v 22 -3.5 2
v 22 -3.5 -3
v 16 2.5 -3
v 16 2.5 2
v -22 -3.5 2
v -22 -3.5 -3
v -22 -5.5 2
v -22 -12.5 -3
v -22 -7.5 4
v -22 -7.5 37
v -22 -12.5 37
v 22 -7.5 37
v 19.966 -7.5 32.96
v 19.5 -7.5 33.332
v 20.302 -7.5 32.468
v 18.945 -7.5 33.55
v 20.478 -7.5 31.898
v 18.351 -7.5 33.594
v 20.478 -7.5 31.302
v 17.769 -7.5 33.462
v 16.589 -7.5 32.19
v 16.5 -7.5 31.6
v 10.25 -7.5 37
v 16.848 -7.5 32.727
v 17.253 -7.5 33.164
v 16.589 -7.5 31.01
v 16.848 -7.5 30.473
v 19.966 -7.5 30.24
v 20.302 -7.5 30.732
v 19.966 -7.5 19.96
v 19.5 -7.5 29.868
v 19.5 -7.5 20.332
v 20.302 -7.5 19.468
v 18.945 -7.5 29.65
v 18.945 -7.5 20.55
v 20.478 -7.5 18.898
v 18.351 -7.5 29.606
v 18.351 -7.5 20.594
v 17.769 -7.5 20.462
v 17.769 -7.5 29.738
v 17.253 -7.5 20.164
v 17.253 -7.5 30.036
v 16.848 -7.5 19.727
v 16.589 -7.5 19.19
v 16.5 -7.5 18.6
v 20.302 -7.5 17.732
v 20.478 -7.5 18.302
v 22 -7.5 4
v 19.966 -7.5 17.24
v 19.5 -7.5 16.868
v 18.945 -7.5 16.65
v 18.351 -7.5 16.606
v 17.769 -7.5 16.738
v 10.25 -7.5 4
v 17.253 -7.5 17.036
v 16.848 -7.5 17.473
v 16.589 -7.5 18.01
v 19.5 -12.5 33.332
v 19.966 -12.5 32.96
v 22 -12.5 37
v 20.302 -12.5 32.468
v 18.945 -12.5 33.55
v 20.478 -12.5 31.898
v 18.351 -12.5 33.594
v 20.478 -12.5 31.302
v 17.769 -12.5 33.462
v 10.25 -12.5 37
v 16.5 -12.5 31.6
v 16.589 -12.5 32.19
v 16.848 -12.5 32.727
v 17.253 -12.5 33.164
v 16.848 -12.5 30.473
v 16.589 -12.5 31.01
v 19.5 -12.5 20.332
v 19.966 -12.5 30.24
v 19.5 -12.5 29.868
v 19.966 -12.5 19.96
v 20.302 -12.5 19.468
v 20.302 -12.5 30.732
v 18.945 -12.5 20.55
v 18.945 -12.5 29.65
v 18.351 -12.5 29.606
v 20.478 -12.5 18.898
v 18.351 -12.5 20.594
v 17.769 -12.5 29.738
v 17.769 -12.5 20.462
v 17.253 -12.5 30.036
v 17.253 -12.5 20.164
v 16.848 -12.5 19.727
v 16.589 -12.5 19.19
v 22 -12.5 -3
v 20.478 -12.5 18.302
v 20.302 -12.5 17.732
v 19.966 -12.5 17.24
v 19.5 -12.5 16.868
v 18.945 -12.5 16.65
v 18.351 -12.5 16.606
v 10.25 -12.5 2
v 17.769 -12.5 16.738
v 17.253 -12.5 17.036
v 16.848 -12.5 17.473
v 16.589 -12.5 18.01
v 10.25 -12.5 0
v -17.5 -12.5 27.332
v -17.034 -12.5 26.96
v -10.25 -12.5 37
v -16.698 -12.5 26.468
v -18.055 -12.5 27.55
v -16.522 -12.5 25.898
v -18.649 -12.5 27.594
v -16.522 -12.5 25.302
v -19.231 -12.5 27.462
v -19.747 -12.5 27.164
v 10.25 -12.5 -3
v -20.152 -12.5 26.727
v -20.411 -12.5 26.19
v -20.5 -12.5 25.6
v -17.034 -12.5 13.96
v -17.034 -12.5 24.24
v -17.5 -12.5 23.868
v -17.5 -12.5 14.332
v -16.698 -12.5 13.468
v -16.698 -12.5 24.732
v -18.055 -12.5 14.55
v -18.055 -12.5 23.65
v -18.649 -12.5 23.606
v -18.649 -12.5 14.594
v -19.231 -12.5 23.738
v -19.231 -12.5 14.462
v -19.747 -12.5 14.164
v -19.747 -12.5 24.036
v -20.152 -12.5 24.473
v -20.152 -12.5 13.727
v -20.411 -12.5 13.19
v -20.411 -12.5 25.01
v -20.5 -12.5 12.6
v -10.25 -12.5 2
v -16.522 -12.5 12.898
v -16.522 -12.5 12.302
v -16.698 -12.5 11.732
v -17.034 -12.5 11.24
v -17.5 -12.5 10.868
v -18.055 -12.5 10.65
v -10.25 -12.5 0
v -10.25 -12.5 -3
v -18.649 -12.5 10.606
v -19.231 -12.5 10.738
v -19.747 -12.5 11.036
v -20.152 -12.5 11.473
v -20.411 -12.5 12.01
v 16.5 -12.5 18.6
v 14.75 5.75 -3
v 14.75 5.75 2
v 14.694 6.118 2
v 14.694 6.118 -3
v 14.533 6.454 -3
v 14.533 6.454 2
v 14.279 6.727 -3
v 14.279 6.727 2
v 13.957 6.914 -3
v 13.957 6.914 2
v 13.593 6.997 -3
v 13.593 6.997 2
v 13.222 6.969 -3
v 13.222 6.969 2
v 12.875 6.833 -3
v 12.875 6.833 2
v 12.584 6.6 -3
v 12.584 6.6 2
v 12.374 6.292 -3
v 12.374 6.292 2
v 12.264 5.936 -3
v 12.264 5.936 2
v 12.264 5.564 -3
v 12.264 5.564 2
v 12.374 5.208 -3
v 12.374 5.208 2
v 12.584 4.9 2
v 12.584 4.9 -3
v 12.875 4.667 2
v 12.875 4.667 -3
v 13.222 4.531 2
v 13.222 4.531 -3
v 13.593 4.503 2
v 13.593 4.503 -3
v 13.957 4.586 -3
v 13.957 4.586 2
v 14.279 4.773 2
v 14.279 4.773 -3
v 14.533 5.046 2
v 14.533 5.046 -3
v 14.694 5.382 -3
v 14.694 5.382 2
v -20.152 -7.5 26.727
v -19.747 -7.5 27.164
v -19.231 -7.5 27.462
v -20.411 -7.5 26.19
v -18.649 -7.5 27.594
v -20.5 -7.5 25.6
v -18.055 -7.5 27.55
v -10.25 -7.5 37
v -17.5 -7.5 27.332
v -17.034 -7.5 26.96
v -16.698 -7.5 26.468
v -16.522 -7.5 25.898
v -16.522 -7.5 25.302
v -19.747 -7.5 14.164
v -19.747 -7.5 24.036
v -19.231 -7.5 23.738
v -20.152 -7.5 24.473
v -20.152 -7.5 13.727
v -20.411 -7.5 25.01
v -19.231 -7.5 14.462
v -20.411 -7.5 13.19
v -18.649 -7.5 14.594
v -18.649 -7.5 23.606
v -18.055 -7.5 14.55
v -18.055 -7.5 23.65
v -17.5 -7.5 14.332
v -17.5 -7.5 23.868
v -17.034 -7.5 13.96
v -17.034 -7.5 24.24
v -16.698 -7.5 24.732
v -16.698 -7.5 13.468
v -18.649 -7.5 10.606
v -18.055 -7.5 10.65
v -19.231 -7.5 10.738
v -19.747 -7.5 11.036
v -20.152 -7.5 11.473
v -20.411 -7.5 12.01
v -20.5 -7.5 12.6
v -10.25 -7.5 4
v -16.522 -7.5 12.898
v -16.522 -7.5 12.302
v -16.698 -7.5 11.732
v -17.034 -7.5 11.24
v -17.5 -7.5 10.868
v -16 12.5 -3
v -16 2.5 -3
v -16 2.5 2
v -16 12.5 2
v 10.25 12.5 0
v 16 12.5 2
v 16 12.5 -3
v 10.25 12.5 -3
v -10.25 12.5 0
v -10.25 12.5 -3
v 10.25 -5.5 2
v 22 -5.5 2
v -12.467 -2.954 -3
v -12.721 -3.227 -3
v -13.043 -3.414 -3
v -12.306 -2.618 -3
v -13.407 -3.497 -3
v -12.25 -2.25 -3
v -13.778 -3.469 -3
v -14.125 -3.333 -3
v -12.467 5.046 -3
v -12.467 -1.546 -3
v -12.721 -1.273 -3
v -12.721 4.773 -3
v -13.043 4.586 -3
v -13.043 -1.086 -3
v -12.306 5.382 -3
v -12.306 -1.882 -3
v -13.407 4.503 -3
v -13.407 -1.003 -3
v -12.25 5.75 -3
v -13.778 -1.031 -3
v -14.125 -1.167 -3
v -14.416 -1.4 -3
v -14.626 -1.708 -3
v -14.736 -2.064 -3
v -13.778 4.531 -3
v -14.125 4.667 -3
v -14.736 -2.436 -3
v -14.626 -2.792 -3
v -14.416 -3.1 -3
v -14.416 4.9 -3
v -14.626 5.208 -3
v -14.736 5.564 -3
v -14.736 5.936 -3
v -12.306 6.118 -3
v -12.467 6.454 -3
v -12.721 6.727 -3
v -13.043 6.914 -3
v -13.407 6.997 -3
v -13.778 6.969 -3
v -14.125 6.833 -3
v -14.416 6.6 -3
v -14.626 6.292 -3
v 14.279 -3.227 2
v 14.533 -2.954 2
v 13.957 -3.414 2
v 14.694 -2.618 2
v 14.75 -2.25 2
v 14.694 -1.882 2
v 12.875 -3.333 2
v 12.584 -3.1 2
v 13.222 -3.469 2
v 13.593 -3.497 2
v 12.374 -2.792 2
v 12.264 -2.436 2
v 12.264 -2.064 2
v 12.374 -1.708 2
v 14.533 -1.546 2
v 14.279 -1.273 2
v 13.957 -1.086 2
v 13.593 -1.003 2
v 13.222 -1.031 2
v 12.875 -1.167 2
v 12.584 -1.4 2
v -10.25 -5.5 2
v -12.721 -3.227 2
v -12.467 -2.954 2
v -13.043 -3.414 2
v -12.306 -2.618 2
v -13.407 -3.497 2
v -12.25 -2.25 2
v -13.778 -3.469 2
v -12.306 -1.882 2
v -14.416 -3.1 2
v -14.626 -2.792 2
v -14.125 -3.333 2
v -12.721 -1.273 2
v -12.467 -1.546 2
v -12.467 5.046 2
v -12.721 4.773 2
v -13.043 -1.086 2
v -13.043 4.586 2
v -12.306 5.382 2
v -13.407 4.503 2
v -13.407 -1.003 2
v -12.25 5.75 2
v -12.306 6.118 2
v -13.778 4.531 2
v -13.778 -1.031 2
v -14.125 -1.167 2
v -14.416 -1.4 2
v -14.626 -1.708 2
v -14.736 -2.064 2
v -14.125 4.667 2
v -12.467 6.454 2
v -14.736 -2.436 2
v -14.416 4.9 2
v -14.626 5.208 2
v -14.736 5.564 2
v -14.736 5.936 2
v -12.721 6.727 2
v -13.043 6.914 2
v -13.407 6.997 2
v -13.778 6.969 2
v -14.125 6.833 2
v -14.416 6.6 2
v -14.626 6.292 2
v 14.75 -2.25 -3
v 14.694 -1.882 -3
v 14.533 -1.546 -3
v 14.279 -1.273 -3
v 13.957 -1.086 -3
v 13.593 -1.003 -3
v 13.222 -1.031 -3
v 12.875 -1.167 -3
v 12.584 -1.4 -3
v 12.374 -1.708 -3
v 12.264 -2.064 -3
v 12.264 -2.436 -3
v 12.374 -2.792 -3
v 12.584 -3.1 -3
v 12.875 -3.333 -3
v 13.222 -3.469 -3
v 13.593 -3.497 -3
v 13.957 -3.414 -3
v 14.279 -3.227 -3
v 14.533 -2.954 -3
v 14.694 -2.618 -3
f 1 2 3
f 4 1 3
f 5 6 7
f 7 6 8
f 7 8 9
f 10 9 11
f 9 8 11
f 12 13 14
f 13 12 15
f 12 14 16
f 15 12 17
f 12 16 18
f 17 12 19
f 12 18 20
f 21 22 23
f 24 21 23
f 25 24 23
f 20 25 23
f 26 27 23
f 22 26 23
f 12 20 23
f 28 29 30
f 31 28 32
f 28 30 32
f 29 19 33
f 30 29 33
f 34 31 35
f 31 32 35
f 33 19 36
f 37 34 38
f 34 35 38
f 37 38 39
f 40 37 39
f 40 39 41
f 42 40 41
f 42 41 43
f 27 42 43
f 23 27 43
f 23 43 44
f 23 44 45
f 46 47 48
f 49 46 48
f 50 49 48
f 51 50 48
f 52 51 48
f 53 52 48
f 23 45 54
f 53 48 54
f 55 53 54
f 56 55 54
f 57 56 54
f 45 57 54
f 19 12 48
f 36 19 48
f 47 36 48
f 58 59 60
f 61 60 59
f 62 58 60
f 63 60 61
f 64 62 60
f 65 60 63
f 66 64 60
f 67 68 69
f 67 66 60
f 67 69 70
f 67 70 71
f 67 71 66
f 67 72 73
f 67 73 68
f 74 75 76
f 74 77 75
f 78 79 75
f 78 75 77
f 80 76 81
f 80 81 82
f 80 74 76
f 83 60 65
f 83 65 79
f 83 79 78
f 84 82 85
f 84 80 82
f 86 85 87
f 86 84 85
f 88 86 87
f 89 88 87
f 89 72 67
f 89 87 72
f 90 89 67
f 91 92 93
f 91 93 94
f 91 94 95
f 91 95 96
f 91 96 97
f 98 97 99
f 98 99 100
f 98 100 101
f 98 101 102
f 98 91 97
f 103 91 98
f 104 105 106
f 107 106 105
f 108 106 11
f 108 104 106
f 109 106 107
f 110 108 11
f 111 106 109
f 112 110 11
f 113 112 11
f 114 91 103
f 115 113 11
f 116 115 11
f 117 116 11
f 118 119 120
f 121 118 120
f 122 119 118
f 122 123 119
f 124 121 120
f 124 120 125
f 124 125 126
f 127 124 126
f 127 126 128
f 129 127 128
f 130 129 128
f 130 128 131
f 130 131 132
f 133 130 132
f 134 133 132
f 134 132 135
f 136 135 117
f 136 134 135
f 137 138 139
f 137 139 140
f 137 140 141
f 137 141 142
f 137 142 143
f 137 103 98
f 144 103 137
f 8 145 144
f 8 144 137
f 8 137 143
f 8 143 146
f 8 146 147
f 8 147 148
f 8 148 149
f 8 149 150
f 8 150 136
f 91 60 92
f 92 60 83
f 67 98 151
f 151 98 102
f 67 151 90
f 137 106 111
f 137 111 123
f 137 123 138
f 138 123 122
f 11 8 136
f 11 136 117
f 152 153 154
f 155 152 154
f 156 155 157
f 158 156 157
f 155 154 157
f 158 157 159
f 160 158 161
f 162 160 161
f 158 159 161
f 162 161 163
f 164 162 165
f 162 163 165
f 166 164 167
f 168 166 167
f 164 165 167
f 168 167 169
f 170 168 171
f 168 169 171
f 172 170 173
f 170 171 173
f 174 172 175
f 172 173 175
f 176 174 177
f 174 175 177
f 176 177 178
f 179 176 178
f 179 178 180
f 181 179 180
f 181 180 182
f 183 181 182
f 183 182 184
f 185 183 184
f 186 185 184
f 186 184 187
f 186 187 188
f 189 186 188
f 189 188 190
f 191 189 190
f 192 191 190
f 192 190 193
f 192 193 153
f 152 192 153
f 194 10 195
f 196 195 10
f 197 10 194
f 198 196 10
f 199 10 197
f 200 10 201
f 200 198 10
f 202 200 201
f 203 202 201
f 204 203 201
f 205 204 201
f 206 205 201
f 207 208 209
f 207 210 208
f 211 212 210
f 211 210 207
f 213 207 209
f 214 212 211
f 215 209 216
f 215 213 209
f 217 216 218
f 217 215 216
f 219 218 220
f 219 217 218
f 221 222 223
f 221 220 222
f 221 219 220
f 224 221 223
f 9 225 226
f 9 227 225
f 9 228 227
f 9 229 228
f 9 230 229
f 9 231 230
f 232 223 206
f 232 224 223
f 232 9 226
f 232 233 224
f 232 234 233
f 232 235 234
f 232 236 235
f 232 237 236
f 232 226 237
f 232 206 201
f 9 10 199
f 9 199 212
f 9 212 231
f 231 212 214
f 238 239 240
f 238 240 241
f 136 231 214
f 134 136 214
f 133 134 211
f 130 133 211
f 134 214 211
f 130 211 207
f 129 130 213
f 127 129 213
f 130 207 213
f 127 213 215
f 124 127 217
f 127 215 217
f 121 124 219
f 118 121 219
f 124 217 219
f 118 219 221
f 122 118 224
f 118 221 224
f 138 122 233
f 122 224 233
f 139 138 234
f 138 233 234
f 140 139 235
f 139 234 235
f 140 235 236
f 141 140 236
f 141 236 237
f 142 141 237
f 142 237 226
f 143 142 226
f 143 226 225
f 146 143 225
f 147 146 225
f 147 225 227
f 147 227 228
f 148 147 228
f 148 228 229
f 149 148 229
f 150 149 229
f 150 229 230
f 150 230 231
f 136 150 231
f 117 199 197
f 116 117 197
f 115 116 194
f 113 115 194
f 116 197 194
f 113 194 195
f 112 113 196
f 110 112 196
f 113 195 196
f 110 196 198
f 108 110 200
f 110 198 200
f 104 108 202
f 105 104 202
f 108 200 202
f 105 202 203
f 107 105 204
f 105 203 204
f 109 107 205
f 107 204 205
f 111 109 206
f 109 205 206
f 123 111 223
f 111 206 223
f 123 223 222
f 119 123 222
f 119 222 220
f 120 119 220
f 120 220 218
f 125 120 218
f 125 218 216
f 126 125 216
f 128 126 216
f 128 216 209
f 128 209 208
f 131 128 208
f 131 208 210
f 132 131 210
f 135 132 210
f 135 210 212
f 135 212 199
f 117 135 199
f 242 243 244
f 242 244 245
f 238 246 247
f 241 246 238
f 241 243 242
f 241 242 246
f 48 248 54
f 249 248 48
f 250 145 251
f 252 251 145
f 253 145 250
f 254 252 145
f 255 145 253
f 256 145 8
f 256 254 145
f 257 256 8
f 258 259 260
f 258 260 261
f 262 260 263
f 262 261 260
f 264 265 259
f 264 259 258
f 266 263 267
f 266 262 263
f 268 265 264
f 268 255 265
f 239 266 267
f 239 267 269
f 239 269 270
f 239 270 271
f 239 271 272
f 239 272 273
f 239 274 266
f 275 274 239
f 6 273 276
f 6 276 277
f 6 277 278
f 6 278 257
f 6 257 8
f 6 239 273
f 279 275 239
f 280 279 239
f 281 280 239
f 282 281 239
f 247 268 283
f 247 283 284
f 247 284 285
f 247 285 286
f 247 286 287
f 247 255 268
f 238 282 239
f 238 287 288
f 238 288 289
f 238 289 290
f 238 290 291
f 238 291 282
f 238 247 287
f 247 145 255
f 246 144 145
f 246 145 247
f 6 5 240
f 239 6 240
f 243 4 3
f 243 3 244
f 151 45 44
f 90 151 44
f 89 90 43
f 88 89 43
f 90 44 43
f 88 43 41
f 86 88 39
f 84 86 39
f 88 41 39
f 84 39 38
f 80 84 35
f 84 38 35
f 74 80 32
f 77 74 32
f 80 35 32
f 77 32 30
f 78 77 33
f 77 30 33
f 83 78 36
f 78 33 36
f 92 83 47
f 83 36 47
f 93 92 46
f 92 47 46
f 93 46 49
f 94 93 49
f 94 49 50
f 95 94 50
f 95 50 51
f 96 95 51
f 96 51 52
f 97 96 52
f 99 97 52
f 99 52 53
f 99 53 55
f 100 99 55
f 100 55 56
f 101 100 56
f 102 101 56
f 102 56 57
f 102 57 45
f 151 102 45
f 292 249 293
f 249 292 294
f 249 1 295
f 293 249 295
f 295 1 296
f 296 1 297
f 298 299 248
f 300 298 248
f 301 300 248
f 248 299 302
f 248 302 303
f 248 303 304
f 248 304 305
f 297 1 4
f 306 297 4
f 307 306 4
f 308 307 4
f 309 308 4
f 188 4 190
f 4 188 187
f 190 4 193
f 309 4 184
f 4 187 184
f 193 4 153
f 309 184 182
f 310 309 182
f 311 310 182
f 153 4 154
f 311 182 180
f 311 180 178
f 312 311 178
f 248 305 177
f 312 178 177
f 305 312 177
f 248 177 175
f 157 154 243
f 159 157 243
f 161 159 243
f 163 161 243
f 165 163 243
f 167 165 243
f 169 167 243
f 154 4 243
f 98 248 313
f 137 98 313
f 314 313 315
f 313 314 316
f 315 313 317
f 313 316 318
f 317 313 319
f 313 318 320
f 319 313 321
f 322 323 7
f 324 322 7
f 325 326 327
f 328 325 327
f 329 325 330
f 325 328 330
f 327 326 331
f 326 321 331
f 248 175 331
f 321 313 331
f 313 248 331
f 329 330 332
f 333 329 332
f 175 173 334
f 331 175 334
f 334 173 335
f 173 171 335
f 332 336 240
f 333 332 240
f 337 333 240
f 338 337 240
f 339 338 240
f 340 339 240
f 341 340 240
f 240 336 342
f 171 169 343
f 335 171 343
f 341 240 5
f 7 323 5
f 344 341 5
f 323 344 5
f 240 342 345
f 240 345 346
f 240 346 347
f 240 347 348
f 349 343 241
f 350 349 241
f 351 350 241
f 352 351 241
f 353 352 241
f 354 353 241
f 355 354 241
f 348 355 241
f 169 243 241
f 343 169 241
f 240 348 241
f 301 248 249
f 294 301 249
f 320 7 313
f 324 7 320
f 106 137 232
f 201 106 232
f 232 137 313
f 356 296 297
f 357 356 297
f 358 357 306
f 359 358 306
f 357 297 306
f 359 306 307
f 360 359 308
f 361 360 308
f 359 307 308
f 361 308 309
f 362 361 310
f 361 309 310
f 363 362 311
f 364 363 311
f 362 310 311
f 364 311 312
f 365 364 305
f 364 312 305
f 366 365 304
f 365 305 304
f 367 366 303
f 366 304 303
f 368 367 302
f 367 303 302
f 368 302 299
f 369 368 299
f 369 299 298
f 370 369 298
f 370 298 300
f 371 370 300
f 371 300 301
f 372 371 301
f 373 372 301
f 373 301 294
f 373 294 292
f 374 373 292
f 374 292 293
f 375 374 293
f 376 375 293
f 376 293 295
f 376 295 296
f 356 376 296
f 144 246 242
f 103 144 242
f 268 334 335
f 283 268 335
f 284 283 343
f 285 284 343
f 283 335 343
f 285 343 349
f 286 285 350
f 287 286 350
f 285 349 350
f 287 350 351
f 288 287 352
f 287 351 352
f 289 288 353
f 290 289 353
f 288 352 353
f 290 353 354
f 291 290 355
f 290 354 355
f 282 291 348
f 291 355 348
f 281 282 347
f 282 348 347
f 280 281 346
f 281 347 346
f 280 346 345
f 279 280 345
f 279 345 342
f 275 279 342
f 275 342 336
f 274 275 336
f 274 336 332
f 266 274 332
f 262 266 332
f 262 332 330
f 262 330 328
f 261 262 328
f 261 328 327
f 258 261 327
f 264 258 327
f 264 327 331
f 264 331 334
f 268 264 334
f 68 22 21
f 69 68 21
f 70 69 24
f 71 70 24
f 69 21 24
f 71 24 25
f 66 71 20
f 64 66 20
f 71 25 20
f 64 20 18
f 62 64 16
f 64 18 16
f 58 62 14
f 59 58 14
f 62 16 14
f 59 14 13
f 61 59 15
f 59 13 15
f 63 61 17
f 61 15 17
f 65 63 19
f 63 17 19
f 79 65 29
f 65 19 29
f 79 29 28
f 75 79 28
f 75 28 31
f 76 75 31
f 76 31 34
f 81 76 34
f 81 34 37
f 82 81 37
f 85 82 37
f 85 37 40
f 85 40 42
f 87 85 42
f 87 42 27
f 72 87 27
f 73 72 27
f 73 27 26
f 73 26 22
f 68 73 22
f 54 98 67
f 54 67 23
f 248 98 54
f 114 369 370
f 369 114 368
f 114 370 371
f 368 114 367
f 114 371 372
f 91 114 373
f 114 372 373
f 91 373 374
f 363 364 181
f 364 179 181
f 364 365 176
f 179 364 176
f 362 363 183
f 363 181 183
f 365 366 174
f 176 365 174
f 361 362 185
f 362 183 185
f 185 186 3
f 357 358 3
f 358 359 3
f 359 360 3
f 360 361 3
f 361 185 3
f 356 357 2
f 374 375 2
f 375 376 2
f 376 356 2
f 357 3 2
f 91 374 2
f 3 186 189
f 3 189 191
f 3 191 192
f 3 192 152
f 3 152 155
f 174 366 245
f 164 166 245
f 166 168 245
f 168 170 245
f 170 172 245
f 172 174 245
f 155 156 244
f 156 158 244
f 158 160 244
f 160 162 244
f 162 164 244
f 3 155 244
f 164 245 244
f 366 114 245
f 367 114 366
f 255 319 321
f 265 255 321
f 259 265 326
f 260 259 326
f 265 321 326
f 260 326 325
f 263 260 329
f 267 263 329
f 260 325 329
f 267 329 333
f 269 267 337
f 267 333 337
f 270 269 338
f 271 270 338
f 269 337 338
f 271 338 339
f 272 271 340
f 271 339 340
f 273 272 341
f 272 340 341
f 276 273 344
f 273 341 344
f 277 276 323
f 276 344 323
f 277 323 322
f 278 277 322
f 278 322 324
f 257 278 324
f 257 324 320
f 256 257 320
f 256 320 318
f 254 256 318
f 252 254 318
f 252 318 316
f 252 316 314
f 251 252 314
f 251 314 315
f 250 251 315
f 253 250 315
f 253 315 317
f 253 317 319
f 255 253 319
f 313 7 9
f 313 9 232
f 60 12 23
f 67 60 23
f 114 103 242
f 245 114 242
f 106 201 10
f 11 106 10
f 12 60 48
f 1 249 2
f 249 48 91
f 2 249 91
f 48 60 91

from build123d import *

# Parameters (mm, degrees)
SZKIC1_W                    = 32
SZKIC1_H                    = 25
DODANIE_WYCI_GNI_CIE1_DEPTH = 2
SZKIC2_W                    = 5.75
SZKIC2_H                    = 25
DODANIE_WYCI_GNI_CIE2_DEPTH = 3
SZKIC4_W                    = 11.75
SZKIC4_H                    = 5
SZKIC4_W_2                  = 6
SZKIC4_W_3                  = 5.75
DODANIE_WYCI_GNI_CIE3_DEPTH = 40
SZKIC5_R                    = 1.25
WYTNIJ_WYCI_GNI_CIE1_DEPTH  = 35
SZKIC7_R                    = 2
WYTNIJ_WYCI_GNI_CIE2_DEPTH  = 35
SFAZOWANIE1_SIZE            = 10
SFAZOWANIE2_SIZE            = 2


with BuildPart() as part:
    # Szkic1 → Dodanie-wyciągnięcie1 (new body)
    with BuildSketch(Plane.XY):
        Rectangle(SZKIC1_W, SZKIC1_H)
    extrude(amount=DODANIE_WYCI_GNI_CIE1_DEPTH)

    # Szkic2 → Dodanie-wyciągnięcie2 (add)
    with BuildSketch(Plane(origin=(0, 0, 0), x_dir=(-1, 0, 0), z_dir=(0, 0, -1))):
        with Locations((-13.125, 0)):
            Rectangle(SZKIC2_W, SZKIC2_H)
        with Locations((13.125, 0)):
            Rectangle(SZKIC2_W, SZKIC2_H)
    extrude(amount=DODANIE_WYCI_GNI_CIE2_DEPTH)

    # Szkic4 → Dodanie-wyciągnięcie3 (add)
    with BuildSketch(Plane(origin=(0, 0, -3), x_dir=(-1, 0, 0), z_dir=(0, 0, -1))):
        with Locations((-16.125, -10)):
            Rectangle(SZKIC4_W, SZKIC4_H)
        with Locations((19, -10)):
            Rectangle(SZKIC4_W_2, SZKIC4_H)
        with Locations((13.125, -10)):
            Rectangle(SZKIC4_W_3, SZKIC4_H)
    extrude(amount=-DODANIE_WYCI_GNI_CIE3_DEPTH)

    # Szkic5 → Wytnij-wyciągnięcie1 (cut)
    with BuildSketch(Plane.XY.offset(2)):
        with Locations((-13.5, 5.75)):
            Circle(SZKIC5_R)
        with Locations((-13.5, -2.25)):
            Circle(SZKIC5_R)
        with Locations((13.5, -2.25)):
            Circle(SZKIC5_R)
        with Locations((13.5, 5.75)):
            Circle(SZKIC5_R)
    extrude(amount=-WYTNIJ_WYCI_GNI_CIE1_DEPTH, mode=Mode.SUBTRACT)

    # Szkic7 → Wytnij-wyciągnięcie2 (cut)
    with BuildSketch(Plane(origin=(0, -7.5, 0), x_dir=(1, 0, 0), z_dir=(0, 1, 0))):
        with Locations(Location((18.5, -31.6, 0), (0, 0, 180))):
            Circle(SZKIC7_R)
        with Locations(Location((18.5, -18.6, 0), (0, 0, 180))):
            Circle(SZKIC7_R)
        with Locations(Location((-18.5, -25.6, 0), (0, 0, 180))):
            Circle(SZKIC7_R)
        with Locations(Location((-18.5, -12.6, 0), (0, 0, 180))):
            Circle(SZKIC7_R)
    extrude(amount=-WYTNIJ_WYCI_GNI_CIE2_DEPTH, mode=Mode.SUBTRACT)

    # Sfazowanie1
    # the kernel refuses this chamfer: 10 mm, written as the material it adds along each edge
    with BuildSketch(Plane(origin=(16, -7.5, -3), x_dir=(0.9996219169112968, -0.027495876610586317, 0), z_dir=(0, 0, 1))) as sfazowanie1_piece_1_section:
        Polygon((SFAZOWANIE1_SIZE * 0.999621916911, SFAZOWANIE1_SIZE * 0.0274958766106), (-SFAZOWANIE1_SIZE * 0.0274958766106, SFAZOWANIE1_SIZE * 0.999621916911), (0, 0), align=None)
    sfazowanie1_piece_1 = extrude(amount=5, mode=Mode.PRIVATE)
    sfazowanie1_piece_1 = split(sfazowanie1_piece_1, bisect_by=Plane(origin=(22, -3.749905405, -0.5), z_dir=(-1, 0, 0)), keep=Keep.TOP, mode=Mode.PRIVATE)
    add(sfazowanie1_piece_1)
    with BuildSketch(Plane(origin=(-16, -7.5, 2), x_dir=(-0.9996219169112968, -0.027495876610586403, 0), z_dir=(0, 0, -1))) as sfazowanie1_piece_2_section:
        Polygon((SFAZOWANIE1_SIZE * 0.999621916911, SFAZOWANIE1_SIZE * 0.0274958766106), (-SFAZOWANIE1_SIZE * 0.0274958766106, SFAZOWANIE1_SIZE * 0.999621916911), (0, 0), align=None)
    sfazowanie1_piece_2 = extrude(amount=5, mode=Mode.PRIVATE)
    sfazowanie1_piece_2 = split(sfazowanie1_piece_2, bisect_by=Plane(origin=(-22, -3.749905405, -0.5), z_dir=(1, 0, 0)), keep=Keep.TOP, mode=Mode.PRIVATE)
    add(sfazowanie1_piece_2)

    # Sfazowanie2
    sfazowanie2_edges = [part.edges().sort_by_distance(p)[0] for p in [
        (16.125, -7.5, 2),
        (-16.125, -7.5, 2),
    ]]
    chamfer(sfazowanie2_edges, length=SFAZOWANIE2_SIZE)


solid = part.part
